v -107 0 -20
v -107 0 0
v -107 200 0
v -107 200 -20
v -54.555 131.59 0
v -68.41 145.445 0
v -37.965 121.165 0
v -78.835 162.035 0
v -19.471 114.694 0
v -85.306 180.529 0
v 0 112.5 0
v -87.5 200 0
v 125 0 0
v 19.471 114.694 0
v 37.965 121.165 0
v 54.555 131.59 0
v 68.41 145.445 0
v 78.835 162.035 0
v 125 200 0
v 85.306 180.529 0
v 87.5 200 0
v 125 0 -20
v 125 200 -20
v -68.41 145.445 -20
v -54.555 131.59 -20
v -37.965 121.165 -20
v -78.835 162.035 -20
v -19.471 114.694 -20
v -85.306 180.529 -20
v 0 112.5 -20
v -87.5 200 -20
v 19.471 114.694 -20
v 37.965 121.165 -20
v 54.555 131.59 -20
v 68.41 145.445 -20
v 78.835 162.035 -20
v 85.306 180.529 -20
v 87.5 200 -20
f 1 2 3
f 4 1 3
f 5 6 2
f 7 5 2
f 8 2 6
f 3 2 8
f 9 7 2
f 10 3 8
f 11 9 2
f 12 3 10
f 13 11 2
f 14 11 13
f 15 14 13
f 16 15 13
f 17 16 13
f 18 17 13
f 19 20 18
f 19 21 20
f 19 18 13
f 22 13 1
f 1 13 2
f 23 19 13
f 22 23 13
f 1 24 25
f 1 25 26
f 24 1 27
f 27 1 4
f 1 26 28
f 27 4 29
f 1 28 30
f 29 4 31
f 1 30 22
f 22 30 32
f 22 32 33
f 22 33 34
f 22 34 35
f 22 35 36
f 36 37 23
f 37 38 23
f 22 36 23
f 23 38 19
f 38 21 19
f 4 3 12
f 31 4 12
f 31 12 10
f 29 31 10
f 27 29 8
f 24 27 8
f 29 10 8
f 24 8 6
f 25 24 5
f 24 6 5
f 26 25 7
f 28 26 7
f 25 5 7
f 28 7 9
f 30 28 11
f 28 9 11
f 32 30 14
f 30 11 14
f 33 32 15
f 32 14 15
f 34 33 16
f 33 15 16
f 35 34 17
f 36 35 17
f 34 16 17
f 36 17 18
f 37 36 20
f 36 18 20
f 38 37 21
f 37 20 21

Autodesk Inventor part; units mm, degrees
ref_plane "YZ Plane" through (0, 0, 0) normal (1, 0, 0) x (0, 1, 0)
ref_plane "XZ Plane" through (0, 0, 0) normal (0, 1, 0) x (-1, 0, 0)
ref_plane "XY Plane" through (0, 0, 0) normal (0, 0, 1) x (1, 0, 0)
sketch "Sketch1" plane through (0, 0, 0) normal (0, 0, 1) x (1, 0, 0)
  arc A0 (-87.5, 200) -> (87.5, 200) centre (0, 200) ccw
  line L0 (87.5, 200) -> (125, 200)
  line L1 (125, 200) -> (125, 0)
  line L2 (125, 0) -> (-107, 0)
  line L3 (-107, 0) -> (-107, 200)
  line L4 (-107, 200) -> (-87.5, 200)
  point P0 (0, 0)
  dimension "d0" = 200
  dimension "d1" = 175
  dimension "d2" = 37.5
  dimension "d3" = 232
  dimension "d4" = 125
  dimension "d5" = 200
extrude "Extrusion1" add sketch "Sketch1" against normal blind 20
properties part number "Weldedsupportpart1"
